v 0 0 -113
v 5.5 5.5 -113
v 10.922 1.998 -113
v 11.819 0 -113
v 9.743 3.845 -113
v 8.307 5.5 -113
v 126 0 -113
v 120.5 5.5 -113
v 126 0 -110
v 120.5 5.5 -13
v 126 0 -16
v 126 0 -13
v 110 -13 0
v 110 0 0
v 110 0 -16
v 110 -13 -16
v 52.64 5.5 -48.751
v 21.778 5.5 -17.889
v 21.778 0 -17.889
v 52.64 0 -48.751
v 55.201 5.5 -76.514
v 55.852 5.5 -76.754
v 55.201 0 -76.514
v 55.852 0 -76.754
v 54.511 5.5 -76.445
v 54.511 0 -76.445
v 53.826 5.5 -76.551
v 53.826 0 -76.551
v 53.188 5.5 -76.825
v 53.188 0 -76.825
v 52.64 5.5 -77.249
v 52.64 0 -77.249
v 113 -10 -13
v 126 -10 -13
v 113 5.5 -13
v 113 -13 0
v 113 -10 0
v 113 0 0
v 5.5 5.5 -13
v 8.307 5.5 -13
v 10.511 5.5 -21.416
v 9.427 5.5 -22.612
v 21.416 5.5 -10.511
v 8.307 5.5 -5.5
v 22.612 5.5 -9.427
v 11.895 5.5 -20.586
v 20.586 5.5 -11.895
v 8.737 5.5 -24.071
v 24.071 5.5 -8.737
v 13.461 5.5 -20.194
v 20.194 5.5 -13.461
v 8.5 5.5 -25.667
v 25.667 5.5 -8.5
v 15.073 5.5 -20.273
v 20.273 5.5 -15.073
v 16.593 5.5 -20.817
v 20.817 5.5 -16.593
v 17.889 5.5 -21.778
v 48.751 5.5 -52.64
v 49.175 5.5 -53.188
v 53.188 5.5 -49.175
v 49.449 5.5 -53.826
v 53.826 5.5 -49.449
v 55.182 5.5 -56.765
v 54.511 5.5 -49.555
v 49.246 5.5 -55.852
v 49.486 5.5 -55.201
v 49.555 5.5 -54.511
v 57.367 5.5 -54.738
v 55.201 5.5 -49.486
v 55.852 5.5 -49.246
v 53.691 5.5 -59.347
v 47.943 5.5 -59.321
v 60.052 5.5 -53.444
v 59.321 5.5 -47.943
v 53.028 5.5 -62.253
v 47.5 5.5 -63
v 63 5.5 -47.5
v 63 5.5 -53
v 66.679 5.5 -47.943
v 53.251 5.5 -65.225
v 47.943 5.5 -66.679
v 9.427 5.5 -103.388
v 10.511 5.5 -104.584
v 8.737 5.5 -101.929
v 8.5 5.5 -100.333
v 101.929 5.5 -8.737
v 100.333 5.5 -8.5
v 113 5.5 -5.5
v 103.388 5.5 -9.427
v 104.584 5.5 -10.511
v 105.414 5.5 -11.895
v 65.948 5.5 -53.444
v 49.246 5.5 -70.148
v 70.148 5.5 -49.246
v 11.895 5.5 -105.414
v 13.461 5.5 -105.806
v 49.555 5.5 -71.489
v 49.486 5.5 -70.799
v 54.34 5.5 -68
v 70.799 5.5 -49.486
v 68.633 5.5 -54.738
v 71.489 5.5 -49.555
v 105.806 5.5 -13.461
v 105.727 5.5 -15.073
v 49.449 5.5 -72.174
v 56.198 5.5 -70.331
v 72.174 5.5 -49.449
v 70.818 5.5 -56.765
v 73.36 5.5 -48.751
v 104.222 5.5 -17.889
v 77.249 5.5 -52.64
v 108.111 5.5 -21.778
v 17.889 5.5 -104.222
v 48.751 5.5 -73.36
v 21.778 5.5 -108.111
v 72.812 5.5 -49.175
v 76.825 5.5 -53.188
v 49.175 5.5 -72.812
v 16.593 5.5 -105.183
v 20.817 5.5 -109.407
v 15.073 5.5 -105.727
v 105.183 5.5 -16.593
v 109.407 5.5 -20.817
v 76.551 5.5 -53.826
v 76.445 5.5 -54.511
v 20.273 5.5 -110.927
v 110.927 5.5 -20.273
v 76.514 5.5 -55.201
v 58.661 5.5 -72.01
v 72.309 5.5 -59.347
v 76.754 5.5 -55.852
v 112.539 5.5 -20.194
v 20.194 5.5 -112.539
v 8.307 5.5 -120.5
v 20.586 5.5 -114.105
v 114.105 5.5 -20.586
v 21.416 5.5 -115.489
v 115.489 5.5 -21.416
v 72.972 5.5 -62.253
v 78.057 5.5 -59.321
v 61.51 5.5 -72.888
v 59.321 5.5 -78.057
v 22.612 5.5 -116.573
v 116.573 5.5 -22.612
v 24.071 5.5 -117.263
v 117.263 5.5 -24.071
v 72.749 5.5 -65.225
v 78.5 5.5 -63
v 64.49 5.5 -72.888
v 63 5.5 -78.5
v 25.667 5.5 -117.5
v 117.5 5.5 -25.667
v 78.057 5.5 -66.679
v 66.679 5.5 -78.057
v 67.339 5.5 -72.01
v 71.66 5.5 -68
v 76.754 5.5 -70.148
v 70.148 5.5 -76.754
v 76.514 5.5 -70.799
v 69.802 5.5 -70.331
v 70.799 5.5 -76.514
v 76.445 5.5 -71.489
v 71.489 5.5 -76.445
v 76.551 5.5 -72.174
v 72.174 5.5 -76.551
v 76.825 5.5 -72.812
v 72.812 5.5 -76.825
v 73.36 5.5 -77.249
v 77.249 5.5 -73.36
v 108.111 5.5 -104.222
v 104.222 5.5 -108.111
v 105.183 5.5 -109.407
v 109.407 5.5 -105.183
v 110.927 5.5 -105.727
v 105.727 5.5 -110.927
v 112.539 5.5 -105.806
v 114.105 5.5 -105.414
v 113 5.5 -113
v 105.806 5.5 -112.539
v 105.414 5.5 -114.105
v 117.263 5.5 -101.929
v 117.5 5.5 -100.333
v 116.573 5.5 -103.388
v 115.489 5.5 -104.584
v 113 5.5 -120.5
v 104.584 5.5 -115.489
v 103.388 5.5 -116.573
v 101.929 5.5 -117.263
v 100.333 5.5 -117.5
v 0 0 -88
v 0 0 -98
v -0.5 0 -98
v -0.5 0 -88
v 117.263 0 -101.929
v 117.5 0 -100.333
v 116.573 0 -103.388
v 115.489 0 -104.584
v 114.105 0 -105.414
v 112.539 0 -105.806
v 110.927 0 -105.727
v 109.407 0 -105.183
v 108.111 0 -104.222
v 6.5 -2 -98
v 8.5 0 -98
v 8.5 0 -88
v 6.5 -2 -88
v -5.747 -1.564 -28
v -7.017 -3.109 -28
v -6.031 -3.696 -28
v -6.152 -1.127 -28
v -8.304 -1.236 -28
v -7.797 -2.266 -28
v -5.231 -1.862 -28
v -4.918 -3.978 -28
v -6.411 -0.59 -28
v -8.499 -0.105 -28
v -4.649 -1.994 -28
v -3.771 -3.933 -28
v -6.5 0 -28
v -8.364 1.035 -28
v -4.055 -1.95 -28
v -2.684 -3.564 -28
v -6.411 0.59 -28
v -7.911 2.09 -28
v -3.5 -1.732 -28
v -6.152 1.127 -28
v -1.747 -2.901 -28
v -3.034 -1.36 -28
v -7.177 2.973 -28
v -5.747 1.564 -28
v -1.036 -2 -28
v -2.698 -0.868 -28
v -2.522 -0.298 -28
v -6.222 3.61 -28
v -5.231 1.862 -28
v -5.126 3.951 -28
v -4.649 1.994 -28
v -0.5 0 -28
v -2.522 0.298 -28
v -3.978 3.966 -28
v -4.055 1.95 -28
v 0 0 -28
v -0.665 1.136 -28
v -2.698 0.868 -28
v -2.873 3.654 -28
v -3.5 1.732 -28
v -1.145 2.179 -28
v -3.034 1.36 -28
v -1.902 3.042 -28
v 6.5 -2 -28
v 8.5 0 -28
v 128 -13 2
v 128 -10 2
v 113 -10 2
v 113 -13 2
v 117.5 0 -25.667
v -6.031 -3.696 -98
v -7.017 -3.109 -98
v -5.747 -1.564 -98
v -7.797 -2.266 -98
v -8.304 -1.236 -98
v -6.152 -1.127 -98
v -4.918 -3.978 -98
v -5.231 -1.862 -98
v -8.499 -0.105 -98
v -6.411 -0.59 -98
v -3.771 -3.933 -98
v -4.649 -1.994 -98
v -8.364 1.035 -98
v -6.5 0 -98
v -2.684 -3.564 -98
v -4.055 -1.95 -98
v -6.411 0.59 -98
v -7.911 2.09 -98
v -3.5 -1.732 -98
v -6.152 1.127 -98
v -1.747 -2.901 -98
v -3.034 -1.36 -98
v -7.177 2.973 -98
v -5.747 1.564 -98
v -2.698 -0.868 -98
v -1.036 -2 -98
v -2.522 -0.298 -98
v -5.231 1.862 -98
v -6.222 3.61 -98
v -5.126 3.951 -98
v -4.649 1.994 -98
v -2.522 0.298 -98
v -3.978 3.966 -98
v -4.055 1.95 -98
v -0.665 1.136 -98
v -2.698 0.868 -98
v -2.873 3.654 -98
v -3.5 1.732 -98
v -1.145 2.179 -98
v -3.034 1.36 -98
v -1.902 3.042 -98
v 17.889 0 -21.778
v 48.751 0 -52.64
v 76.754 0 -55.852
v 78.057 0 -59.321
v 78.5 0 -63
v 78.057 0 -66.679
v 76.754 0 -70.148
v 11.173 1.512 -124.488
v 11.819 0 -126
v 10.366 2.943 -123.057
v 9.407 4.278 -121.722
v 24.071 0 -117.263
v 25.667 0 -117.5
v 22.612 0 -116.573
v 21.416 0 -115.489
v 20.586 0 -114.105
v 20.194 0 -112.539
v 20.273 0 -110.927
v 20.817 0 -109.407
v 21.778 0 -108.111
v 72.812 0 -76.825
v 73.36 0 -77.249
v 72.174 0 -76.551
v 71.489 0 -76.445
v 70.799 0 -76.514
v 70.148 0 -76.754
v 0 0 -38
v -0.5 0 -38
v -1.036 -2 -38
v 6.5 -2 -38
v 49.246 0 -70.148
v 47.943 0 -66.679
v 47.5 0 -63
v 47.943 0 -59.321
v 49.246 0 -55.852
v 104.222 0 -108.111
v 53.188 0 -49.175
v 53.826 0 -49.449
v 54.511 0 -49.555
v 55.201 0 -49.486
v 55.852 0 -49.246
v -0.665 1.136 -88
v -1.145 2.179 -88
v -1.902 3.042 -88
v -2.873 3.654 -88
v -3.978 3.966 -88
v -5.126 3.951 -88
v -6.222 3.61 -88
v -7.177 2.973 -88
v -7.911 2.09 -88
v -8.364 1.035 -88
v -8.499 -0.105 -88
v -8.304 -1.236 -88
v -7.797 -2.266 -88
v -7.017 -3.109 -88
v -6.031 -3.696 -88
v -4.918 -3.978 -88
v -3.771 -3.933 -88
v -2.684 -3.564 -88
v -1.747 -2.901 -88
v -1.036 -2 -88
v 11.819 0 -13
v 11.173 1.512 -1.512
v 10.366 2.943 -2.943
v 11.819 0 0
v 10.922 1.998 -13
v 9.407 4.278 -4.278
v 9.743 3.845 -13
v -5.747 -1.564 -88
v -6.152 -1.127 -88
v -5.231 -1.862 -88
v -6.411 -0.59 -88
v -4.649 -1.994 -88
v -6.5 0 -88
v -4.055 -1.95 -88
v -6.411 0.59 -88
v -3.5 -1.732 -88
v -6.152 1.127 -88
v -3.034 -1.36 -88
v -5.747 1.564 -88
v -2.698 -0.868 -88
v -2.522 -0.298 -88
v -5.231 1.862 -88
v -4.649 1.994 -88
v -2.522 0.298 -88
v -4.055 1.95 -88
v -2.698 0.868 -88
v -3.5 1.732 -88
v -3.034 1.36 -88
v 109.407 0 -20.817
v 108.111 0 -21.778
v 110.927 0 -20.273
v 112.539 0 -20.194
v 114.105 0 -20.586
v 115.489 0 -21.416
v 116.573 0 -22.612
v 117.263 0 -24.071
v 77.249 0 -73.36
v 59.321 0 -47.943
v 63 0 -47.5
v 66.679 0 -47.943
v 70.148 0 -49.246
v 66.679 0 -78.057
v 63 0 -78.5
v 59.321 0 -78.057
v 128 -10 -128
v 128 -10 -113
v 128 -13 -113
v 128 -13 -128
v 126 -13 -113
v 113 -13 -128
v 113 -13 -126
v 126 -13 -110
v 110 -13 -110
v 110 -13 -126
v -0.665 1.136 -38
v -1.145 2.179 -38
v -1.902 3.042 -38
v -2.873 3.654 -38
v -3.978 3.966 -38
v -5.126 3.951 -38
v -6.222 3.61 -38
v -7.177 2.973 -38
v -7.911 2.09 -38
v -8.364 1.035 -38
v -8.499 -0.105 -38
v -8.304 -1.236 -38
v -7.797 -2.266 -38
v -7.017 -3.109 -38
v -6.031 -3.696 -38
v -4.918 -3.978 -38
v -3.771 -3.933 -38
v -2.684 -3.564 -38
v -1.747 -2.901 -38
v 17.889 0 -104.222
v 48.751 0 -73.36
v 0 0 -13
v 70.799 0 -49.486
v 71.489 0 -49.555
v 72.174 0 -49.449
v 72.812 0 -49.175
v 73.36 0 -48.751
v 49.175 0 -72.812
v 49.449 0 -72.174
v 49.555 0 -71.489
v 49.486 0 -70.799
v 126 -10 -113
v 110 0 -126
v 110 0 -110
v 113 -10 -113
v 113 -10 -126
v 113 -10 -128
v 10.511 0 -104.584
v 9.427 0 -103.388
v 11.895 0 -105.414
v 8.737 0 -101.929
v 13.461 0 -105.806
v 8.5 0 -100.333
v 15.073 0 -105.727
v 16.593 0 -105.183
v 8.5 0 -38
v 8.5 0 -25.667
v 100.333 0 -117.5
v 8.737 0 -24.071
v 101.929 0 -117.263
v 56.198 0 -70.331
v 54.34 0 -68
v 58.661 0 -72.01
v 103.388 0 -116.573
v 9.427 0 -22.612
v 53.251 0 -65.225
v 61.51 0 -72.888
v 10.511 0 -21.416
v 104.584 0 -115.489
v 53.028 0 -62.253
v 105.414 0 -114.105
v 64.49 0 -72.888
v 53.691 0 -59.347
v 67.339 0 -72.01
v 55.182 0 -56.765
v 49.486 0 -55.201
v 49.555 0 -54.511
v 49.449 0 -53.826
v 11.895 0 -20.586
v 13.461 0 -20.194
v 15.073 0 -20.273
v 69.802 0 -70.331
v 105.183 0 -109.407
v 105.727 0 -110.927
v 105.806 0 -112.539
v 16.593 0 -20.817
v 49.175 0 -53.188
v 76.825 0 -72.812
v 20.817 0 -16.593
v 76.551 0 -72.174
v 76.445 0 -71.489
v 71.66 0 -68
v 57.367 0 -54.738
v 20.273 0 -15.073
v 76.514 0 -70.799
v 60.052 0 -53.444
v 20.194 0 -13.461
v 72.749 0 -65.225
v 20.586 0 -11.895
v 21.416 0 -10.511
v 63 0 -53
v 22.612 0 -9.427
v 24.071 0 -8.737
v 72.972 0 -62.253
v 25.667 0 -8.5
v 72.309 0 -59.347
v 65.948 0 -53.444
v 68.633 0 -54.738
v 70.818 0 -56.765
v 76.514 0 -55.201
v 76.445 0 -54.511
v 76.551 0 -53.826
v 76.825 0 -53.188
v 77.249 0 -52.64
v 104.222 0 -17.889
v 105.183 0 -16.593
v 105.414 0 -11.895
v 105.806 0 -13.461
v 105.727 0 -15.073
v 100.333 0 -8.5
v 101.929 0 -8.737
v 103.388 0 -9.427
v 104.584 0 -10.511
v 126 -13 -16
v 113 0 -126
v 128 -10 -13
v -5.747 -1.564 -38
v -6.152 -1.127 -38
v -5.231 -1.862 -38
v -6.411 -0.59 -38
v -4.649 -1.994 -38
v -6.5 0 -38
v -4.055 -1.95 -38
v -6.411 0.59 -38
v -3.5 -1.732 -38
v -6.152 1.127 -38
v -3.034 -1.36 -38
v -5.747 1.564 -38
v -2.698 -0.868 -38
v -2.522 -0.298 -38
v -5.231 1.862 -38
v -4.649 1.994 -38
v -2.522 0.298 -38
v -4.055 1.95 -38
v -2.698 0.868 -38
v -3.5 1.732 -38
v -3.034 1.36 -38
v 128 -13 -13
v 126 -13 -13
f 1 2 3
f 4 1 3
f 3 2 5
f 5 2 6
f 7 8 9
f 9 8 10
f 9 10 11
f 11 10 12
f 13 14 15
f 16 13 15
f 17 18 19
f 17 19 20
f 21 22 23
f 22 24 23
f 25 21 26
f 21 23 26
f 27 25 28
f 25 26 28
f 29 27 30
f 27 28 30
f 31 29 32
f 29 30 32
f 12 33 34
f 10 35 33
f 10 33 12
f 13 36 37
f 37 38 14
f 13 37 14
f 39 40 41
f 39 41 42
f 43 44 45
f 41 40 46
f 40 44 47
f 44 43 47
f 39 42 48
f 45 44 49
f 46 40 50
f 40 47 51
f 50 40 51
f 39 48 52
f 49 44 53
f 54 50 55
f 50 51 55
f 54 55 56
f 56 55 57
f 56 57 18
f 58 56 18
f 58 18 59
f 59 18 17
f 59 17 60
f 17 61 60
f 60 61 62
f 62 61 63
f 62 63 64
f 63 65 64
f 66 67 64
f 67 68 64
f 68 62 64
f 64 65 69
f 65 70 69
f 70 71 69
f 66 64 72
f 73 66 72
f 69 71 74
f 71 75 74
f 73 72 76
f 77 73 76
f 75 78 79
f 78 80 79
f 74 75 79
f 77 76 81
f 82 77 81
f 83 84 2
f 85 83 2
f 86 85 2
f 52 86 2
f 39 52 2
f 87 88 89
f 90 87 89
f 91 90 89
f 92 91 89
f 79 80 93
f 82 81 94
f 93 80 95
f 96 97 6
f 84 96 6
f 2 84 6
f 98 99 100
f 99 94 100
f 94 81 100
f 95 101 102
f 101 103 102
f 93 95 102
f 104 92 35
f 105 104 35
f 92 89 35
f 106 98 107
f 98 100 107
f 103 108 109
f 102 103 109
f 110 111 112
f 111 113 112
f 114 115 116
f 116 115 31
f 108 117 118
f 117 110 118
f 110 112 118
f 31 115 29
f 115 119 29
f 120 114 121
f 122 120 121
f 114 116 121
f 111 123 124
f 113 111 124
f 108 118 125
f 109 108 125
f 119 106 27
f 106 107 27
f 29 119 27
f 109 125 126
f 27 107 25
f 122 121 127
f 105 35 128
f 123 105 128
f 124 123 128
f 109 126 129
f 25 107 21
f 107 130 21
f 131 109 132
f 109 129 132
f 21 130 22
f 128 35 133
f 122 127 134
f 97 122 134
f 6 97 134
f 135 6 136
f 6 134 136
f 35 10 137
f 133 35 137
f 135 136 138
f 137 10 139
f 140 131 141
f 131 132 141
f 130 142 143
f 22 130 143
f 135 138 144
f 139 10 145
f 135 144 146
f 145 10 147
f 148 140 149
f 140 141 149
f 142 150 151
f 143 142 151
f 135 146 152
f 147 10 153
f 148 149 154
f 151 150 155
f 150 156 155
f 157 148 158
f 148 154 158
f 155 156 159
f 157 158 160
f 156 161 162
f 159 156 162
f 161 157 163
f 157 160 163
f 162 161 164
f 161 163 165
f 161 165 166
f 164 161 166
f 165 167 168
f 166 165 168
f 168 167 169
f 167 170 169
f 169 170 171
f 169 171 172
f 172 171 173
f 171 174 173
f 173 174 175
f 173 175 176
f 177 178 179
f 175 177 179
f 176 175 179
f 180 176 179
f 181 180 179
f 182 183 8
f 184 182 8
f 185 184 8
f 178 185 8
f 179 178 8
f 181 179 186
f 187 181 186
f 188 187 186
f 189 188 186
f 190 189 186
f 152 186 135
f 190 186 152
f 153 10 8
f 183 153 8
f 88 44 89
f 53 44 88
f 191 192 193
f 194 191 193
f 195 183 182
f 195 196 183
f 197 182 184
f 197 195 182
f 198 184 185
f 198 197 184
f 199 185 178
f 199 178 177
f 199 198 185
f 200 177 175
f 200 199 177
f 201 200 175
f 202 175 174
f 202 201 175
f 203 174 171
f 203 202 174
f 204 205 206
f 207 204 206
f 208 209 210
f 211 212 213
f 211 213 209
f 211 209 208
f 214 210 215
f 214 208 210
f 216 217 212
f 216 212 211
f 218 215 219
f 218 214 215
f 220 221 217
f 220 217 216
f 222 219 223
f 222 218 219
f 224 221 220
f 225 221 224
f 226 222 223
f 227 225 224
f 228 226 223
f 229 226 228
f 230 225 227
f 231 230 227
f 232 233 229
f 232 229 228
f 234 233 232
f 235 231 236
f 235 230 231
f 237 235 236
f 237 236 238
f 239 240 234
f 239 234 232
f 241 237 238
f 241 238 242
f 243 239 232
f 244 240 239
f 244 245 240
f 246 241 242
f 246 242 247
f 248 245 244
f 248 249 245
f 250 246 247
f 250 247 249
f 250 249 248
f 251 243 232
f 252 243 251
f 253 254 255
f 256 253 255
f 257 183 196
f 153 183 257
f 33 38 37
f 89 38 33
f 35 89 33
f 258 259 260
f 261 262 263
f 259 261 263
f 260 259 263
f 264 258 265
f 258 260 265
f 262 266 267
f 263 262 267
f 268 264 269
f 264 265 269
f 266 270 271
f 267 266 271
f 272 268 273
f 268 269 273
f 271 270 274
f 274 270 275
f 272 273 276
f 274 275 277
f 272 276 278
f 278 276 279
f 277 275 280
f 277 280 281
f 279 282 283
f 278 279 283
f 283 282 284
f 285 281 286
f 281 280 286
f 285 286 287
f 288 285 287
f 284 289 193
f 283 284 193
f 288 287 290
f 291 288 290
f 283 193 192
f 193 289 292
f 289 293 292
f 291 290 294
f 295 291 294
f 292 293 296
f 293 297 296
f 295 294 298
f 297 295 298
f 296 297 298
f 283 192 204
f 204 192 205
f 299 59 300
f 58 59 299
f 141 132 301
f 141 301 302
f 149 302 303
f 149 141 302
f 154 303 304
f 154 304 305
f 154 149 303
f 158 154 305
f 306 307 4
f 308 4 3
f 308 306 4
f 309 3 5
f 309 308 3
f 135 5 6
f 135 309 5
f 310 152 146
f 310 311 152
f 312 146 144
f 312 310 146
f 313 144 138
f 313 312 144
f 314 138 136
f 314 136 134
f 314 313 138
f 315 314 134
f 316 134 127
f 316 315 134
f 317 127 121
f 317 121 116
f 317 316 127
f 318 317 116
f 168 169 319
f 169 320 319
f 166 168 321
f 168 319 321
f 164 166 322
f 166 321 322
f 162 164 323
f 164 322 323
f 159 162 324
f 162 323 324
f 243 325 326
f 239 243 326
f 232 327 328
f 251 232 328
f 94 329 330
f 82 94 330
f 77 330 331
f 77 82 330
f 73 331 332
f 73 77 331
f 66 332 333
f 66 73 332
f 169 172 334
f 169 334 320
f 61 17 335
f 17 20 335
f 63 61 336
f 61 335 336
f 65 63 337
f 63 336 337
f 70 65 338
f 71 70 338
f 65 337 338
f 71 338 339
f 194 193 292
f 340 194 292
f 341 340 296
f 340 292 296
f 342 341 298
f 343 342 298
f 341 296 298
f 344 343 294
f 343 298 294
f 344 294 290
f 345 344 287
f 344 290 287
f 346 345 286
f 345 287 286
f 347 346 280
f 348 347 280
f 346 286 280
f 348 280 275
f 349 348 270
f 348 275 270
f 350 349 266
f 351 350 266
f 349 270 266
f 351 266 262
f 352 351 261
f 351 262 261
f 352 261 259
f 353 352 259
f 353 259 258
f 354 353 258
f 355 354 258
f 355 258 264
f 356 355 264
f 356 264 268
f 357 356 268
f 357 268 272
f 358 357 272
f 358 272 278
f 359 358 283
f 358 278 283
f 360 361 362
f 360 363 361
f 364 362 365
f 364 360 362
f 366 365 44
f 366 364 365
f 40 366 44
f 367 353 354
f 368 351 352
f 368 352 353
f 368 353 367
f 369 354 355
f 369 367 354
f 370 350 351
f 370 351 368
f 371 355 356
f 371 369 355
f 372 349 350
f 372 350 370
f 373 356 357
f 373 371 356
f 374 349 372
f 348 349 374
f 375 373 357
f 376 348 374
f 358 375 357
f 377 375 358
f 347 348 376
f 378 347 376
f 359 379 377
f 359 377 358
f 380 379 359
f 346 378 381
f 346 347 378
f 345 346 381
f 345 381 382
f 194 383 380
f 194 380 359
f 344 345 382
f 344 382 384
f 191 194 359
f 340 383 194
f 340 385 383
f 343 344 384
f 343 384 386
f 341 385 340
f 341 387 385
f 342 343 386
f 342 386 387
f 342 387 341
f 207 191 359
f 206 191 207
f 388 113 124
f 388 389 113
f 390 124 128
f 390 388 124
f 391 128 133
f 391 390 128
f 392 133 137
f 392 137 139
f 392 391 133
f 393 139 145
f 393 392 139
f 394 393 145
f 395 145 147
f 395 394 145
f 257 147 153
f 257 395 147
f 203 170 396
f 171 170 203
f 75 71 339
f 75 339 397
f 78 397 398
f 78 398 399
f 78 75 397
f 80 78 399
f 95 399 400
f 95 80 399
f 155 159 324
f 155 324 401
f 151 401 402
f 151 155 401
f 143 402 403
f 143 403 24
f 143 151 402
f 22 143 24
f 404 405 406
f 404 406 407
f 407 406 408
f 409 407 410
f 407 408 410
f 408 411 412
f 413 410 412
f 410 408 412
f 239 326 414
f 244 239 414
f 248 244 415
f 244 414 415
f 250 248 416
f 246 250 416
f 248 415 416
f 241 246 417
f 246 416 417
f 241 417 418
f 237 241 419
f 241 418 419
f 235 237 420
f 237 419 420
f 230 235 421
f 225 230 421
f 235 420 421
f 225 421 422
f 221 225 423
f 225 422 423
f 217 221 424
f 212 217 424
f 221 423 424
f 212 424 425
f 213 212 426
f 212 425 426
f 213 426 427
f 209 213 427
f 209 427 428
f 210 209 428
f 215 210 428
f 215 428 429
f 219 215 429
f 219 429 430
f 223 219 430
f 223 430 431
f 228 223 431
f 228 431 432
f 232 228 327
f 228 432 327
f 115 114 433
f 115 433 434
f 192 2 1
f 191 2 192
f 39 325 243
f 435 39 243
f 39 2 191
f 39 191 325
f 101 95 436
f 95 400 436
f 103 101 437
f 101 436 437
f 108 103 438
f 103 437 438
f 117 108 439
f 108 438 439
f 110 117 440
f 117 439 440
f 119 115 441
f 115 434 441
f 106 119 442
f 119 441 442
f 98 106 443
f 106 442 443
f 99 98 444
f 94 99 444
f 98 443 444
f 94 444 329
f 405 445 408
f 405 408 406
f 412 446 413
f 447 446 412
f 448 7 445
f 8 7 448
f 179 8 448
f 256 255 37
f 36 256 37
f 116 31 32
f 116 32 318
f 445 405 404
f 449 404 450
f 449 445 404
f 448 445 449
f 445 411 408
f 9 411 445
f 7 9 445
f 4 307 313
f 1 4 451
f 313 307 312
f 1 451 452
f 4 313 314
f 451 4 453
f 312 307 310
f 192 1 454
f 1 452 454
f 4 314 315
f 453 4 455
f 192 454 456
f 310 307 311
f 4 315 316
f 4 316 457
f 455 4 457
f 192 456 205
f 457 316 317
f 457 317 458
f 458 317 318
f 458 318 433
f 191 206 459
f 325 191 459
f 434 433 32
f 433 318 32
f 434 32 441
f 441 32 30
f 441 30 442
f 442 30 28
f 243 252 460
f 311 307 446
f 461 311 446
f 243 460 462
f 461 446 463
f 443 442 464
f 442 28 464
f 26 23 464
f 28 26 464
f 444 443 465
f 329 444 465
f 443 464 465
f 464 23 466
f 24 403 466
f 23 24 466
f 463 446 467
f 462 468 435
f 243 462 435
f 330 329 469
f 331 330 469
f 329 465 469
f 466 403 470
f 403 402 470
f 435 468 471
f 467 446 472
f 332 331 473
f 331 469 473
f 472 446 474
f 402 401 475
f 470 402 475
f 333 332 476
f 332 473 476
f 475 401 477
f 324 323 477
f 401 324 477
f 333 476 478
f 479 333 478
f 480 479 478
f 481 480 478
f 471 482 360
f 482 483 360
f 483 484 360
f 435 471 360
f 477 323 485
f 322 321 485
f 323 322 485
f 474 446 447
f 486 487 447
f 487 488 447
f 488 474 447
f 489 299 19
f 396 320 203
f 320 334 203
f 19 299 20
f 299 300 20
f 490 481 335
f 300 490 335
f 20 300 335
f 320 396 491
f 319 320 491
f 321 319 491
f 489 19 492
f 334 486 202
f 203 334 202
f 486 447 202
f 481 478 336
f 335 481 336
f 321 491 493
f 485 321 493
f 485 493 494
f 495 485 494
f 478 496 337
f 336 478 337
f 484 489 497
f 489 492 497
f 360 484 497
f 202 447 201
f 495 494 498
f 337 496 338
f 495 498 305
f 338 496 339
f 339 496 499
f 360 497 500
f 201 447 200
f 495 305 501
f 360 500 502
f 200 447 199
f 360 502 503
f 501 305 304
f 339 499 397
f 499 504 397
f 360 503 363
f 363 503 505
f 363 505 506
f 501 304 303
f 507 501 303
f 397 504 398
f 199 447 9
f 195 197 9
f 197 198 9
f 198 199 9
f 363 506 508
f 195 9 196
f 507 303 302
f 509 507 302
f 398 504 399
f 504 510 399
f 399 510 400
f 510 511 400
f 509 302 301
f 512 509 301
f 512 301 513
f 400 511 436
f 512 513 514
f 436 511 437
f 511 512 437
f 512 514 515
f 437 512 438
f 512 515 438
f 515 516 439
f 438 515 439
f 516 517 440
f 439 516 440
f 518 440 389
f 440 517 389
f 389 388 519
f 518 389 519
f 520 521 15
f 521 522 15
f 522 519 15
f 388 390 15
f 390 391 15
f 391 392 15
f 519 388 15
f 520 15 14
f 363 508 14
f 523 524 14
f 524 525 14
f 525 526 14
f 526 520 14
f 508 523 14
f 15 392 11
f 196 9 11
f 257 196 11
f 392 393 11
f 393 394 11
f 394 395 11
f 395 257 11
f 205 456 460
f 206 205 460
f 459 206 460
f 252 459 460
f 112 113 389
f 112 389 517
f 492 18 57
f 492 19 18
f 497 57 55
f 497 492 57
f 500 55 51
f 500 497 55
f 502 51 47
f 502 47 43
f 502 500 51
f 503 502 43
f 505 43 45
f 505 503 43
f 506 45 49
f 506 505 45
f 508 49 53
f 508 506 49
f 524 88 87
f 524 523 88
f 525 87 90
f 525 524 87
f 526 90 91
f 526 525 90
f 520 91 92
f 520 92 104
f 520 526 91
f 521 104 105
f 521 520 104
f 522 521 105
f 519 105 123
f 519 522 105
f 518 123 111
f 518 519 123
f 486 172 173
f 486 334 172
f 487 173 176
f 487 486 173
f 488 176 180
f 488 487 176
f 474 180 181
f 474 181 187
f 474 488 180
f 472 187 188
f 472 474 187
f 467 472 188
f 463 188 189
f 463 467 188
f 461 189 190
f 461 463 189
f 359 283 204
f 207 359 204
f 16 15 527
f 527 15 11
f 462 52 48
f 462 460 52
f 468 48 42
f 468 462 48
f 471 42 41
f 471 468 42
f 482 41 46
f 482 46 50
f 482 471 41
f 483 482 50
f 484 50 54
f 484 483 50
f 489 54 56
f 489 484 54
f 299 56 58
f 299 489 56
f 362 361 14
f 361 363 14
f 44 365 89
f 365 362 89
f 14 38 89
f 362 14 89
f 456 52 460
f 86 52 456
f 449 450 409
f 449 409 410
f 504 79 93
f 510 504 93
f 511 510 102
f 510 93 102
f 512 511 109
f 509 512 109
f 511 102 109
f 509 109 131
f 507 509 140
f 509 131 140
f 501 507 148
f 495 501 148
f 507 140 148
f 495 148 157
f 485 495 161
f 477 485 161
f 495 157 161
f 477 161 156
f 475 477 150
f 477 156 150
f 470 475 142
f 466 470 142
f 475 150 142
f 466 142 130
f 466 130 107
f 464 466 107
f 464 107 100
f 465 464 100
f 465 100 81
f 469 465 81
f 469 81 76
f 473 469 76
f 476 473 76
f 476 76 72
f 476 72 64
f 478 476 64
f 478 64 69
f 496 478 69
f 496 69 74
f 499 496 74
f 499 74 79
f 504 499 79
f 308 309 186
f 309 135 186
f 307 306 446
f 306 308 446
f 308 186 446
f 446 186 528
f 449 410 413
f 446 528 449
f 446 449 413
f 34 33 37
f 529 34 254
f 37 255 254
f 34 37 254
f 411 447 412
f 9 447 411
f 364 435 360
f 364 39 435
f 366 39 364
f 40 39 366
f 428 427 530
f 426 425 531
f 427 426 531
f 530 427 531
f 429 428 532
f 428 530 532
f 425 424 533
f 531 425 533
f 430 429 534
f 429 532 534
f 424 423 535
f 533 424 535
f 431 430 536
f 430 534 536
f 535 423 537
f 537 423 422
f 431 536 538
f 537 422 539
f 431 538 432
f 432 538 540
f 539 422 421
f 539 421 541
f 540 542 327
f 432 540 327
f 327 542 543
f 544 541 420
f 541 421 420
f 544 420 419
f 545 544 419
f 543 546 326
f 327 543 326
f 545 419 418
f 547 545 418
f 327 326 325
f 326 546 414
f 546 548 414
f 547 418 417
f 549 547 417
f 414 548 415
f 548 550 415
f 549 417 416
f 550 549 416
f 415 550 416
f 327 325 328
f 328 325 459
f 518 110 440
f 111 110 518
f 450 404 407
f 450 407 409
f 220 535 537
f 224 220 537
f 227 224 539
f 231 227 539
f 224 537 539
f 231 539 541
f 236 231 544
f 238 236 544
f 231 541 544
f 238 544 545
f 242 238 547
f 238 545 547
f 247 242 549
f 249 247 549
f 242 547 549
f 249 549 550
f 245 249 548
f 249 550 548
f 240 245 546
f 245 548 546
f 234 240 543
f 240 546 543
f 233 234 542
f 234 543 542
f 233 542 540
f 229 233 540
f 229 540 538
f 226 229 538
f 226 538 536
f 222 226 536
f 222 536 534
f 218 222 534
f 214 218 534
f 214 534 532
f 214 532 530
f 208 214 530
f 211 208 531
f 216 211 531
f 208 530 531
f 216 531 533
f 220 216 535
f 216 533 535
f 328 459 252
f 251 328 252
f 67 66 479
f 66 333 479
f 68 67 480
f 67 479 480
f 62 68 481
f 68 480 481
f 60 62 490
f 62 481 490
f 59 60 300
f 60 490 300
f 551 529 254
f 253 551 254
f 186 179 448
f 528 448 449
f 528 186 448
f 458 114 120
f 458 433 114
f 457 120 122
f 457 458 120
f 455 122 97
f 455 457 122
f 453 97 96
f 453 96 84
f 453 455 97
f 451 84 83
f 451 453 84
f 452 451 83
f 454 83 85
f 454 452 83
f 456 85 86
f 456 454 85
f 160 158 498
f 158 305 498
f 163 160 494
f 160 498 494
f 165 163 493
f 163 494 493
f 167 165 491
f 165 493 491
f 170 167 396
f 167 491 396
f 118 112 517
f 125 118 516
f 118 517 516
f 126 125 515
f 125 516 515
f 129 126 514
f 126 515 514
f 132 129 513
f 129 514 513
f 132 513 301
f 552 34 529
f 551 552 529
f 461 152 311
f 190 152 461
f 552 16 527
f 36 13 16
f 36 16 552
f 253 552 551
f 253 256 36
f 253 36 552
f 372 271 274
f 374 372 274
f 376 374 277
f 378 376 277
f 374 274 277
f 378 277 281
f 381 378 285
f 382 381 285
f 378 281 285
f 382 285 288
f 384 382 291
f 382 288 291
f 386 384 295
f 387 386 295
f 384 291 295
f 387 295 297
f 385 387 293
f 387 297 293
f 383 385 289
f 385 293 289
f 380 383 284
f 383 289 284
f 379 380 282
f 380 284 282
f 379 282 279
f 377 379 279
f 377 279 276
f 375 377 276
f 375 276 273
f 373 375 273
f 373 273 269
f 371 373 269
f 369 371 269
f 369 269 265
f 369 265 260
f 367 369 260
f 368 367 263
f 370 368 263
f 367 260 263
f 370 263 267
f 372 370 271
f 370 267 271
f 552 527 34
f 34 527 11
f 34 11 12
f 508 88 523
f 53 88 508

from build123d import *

# Parameters (mm, degrees)
SKETCH1_W              = 126
SKETCH1_H              = 126
BOSS_EXTRUDE1_DEPTH    = 5.5
CUT_EXTRUDE5_DEPTH     = 179.275769526
SKETCH8_R              = 10
CUT_EXTRUDE6_DEPTH     = 179.275769526
FILLET1_R              = 5.5
FILLET2_R              = 2.75
SKETCH11_W             = 13
SKETCH11_H             = 13
CUT_EXTRUDE7_DEPTH     = 179.275769526
BOSS_EXTRUDE8_START    = -15
SKETCH18_R             = 2
BOSS_EXTRUDE8_DEPTH    = 10
BOSS_EXTRUDE9_START    = -75
SKETCH18_2_R           = 2
BOSS_EXTRUDE9_DEPTH    = 10
BOSS_EXTRUDE10_DEPTH   = 10
BOSS_EXTRUDE11_DEPTH   = 3
BOSS_EXTRUDE12_DEPTH   = 4.692640137
BOSS_EXTRUDE12_START   = -13
BOSS_EXTRUDE12_2_DEPTH = 14
BOSS_EXTRUDE13_DEPTH   = 4.692640137
BOSS_EXTRUDE13_START   = -127
BOSS_EXTRUDE13_2_DEPTH = 14
CHAMFER1_SIZE          = 2


with BuildPart() as part:
    # Sketch1 → Boss-Extrude1 (new body)
    with BuildSketch(Plane(origin=(0, 0, 0), x_dir=(1, 0, 0), z_dir=(0, 1, 0))):
        with Locations((63, 63)):
            Rectangle(SKETCH1_W, SKETCH1_H)
    extrude(amount=BOSS_EXTRUDE1_DEPTH)

    # Sketch7 → Cut-Extrude5 (cut, through all)
    with BuildSketch(Plane.XY):
        Polygon((0, 0), (0, 5.5), (5.5, 5.5), align=None)
        Polygon((126, 0), (126, 5.5), (120.5, 5.5), align=None)
    cut_extrude5 = extrude(amount=-CUT_EXTRUDE5_DEPTH, mode=Mode.SUBTRACT)

    # Mirror1: Cut-Extrude5 across plane
    add(cut_extrude5.mirror(Plane(origin=(0, 0, 0), x_dir=(-0.7071067811865476, 0, 0.7071067811865476), z_dir=(-0.7071067811865477, 0, -0.7071067811865475))), mode=Mode.SUBTRACT)

    # Sketch8 → Cut-Extrude6 (cut, through all)
    with BuildSketch(Plane(origin=(0, 5.5, 0), x_dir=(1, 0, 0), z_dir=(0, 1, 0))):
        with Locations(Location((63, 63, 0), (0, 0, 270))):
            Circle(SKETCH8_R)
        with BuildLine():
            Line((50.269180349, 54.158267646), (8.5, 12.389087297))
            Line((8.5, 12.389087297), (8.5, 113.610912703))
            Line((8.5, 113.610912703), (50.269180349, 71.841732354))
            ThreePointArc((50.269180349, 71.841732354), (47.5, 63), (50.269180349, 54.158267646))
        make_face()
        with BuildLine():
            Line((54.158267646, 75.730819651), (12.389087297, 117.5))
            Line((12.389087297, 117.5), (113.610912703, 117.5))
            Line((113.610912703, 117.5), (71.841732354, 75.730819651))
            ThreePointArc((71.841732354, 75.730819651), (63, 78.5), (54.158267646, 75.730819651))
        make_face()
        with BuildLine():
            Line((75.730819651, 71.841732354), (117.5, 113.610912703))
            Line((117.5, 113.610912703), (117.5, 12.389087297))
            Line((117.5, 12.389087297), (75.730819651, 54.158267646))
            ThreePointArc((75.730819651, 54.158267646), (78.5, 63), (75.730819651, 71.841732354))
        make_face()
        with BuildLine():
            Line((71.841732354, 50.269180349), (113.610912703, 8.5))
            Line((113.610912703, 8.5), (12.389087297, 8.5))
            Line((12.389087297, 8.5), (54.158267646, 50.269180349))
            ThreePointArc((54.158267646, 50.269180349), (63, 47.5), (71.841732354, 50.269180349))
        make_face()
    extrude(amount=-CUT_EXTRUDE6_DEPTH, mode=Mode.SUBTRACT)

    # Fillet1
    fillet1_edges = [part.edges().sort_by_distance(p)[0] for p in [
        (113.610912703, 2.75, -8.5),
        (12.389087297, 2.75, -8.5),
        (117.5, 2.75, -113.610912703),
        (117.5, 2.75, -12.389087297),
        (12.389087297, 2.75, -117.5),
        (113.610912703, 2.75, -117.5),
        (8.5, 2.75, -12.389087297),
        (8.5, 2.75, -113.610912703),
    ]]
    fillet(fillet1_edges, radius=FILLET1_R)

    # Fillet2
    fillet2_edges = [part.edges().sort_by_distance(p)[0] for p in [
        (54.158267646, 2.75, -50.269180349),
        (71.841732354, 2.75, -50.269180349),
        (75.730819651, 2.75, -54.158267646),
        (75.730819651, 2.75, -71.841732354),
        (71.841732354, 2.75, -75.730819651),
        (54.158267646, 2.75, -75.730819651),
        (50.269180349, 2.75, -71.841732354),
        (50.269180349, 2.75, -54.158267646),
    ]]
    fillet(fillet2_edges, radius=FILLET2_R)

    # Sketch11 → Cut-Extrude7 (cut, through all)
    with BuildSketch(Plane(origin=(0, 5.5, 0), x_dir=(1, 0, 0), z_dir=(0, 1, 0))):
        with Locations((6.5, 119.5)):
            Rectangle(SKETCH11_W, SKETCH11_H)
        with Locations((119.5, 119.5)):
            Rectangle(SKETCH11_W, SKETCH11_H)
        with Locations((119.5, 6.5)):
            Rectangle(SKETCH11_W, SKETCH11_H)
        with Locations((6.5, 6.5)):
            Rectangle(SKETCH11_W, SKETCH11_H)
    extrude(amount=-CUT_EXTRUDE7_DEPTH, mode=Mode.SUBTRACT)

    # Sketch18 → Boss-Extrude8 (add)
    with BuildSketch(Plane(origin=(0, 0, -113), x_dir=(-1, 0, 0), z_dir=(0, 0, -1)).offset(BOSS_EXTRUDE8_START)):
        with BuildLine():
            Line((-6.5, 0), (0.5, 0))
            ThreePointArc((0.5, 0), (8.363703305, 1.03527618), (1.035898385, -2))
            Line((1.035898385, -2), (-6.5, -2))
            Line((-6.5, -2), (-6.5, 0))
        make_face()
        with Locations((4.5, 0)):
            Circle(SKETCH18_R, mode=Mode.SUBTRACT)
    extrude(amount=-BOSS_EXTRUDE8_DEPTH)

    # Sketch18<2> → Boss-Extrude9 (add)
    with BuildSketch(Plane(origin=(0, 0, -113), x_dir=(-1, 0, 0), z_dir=(0, 0, -1)).offset(BOSS_EXTRUDE9_START)):
        with BuildLine():
            Line((-6.5, 0), (0.5, 0))
            ThreePointArc((0.5, 0), (8.363703305, 1.03527618), (1.035898385, -2))
            Line((1.035898385, -2), (-6.5, -2))
            Line((-6.5, -2), (-6.5, 0))
        make_face()
        with Locations((4.5, 0)):
            Circle(SKETCH18_2_R, mode=Mode.SUBTRACT)
    extrude(amount=-BOSS_EXTRUDE9_DEPTH)

    # Sketch19 → Boss-Extrude10 (add)
    with BuildSketch(Plane.XZ):
        Polygon((126, -113), (113, -113), (113, -126), (110, -126), (110, -110), (126, -110), align=None)
        Polygon((126, -16), (126, -13), (113, -13), (113, 0), (110, 0), (110, -16), align=None)
    extrude(amount=BOSS_EXTRUDE10_DEPTH)

    # Sketch20 → Boss-Extrude11 (add)
    with BuildSketch(Plane.XZ.offset(10)):
        Polygon((110, -16), (126, -16), (126, -13), (128, -13), (128, 2), (113, 2), (113, 0), (110, 0), align=None)
        Polygon((126, -110), (126, -113), (128, -113), (128, -128), (113, -128), (113, -126), (110, -126), (110, -110), align=None)
    extrude(amount=BOSS_EXTRUDE11_DEPTH)

    # Boss-Extrude12: read off the stored shape, not the designer's step
    # Boss-Extrude12 outline → Boss-Extrude12 (add)
    with BuildSketch(Plane.ZY.offset(-13)):
        Polygon((-13, 5.5), (-13, 0), (0, 0), (-5.5, 5.5), align=None)
    extrude(amount=BOSS_EXTRUDE12_DEPTH)

    # Boss-Extrude12 2 outline → Boss-Extrude12 2 (cut)
    with BuildSketch(Plane.XY.offset(BOSS_EXTRUDE12_START)):
        with BuildLine():
            Line((8.307359863, 0), (11.819098493, 0))
            ThreePointArc((11.819098493, 0), (10.365939115, 2.943279669), (8.307359863, 5.5))
            Line((8.307359863, 5.5), (8.307359863, 0))
        make_face()
    extrude(amount=BOSS_EXTRUDE12_2_DEPTH, mode=Mode.SUBTRACT)

    # Boss-Extrude13: read off the stored shape, not the designer's step
    # Boss-Extrude13 outline → Boss-Extrude13 (add)
    with BuildSketch(Plane.ZY.offset(-13)):
        Polygon((-120.5, 5.5), (-126, 0), (-113, 0), (-113, 5.5), align=None)
    extrude(amount=BOSS_EXTRUDE13_DEPTH)

    # Boss-Extrude13 2 outline → Boss-Extrude13 2 (cut)
    with BuildSketch(Plane.XY.offset(BOSS_EXTRUDE13_START)):
        with BuildLine():
            ThreePointArc((11.819098492, 0), (10.365939114, 2.943279669), (8.307359863, 5.5))
            Line((8.307359863, 5.5), (8.307359863, 0))
            Line((8.307359863, 0), (11.819098492, 0))
        make_face()
    extrude(amount=BOSS_EXTRUDE13_2_DEPTH, mode=Mode.SUBTRACT)

    # Chamfer1
    chamfer1_edges = [part.edges().sort_by_distance(p)[0] for p in [
        (6.5, 0, -93),
        (6.5, 0, -33),
    ]]
    chamfer(chamfer1_edges, length=CHAMFER1_SIZE - 0.0001)  # a hair under: the kernel refuses the full size


solid = part.part
